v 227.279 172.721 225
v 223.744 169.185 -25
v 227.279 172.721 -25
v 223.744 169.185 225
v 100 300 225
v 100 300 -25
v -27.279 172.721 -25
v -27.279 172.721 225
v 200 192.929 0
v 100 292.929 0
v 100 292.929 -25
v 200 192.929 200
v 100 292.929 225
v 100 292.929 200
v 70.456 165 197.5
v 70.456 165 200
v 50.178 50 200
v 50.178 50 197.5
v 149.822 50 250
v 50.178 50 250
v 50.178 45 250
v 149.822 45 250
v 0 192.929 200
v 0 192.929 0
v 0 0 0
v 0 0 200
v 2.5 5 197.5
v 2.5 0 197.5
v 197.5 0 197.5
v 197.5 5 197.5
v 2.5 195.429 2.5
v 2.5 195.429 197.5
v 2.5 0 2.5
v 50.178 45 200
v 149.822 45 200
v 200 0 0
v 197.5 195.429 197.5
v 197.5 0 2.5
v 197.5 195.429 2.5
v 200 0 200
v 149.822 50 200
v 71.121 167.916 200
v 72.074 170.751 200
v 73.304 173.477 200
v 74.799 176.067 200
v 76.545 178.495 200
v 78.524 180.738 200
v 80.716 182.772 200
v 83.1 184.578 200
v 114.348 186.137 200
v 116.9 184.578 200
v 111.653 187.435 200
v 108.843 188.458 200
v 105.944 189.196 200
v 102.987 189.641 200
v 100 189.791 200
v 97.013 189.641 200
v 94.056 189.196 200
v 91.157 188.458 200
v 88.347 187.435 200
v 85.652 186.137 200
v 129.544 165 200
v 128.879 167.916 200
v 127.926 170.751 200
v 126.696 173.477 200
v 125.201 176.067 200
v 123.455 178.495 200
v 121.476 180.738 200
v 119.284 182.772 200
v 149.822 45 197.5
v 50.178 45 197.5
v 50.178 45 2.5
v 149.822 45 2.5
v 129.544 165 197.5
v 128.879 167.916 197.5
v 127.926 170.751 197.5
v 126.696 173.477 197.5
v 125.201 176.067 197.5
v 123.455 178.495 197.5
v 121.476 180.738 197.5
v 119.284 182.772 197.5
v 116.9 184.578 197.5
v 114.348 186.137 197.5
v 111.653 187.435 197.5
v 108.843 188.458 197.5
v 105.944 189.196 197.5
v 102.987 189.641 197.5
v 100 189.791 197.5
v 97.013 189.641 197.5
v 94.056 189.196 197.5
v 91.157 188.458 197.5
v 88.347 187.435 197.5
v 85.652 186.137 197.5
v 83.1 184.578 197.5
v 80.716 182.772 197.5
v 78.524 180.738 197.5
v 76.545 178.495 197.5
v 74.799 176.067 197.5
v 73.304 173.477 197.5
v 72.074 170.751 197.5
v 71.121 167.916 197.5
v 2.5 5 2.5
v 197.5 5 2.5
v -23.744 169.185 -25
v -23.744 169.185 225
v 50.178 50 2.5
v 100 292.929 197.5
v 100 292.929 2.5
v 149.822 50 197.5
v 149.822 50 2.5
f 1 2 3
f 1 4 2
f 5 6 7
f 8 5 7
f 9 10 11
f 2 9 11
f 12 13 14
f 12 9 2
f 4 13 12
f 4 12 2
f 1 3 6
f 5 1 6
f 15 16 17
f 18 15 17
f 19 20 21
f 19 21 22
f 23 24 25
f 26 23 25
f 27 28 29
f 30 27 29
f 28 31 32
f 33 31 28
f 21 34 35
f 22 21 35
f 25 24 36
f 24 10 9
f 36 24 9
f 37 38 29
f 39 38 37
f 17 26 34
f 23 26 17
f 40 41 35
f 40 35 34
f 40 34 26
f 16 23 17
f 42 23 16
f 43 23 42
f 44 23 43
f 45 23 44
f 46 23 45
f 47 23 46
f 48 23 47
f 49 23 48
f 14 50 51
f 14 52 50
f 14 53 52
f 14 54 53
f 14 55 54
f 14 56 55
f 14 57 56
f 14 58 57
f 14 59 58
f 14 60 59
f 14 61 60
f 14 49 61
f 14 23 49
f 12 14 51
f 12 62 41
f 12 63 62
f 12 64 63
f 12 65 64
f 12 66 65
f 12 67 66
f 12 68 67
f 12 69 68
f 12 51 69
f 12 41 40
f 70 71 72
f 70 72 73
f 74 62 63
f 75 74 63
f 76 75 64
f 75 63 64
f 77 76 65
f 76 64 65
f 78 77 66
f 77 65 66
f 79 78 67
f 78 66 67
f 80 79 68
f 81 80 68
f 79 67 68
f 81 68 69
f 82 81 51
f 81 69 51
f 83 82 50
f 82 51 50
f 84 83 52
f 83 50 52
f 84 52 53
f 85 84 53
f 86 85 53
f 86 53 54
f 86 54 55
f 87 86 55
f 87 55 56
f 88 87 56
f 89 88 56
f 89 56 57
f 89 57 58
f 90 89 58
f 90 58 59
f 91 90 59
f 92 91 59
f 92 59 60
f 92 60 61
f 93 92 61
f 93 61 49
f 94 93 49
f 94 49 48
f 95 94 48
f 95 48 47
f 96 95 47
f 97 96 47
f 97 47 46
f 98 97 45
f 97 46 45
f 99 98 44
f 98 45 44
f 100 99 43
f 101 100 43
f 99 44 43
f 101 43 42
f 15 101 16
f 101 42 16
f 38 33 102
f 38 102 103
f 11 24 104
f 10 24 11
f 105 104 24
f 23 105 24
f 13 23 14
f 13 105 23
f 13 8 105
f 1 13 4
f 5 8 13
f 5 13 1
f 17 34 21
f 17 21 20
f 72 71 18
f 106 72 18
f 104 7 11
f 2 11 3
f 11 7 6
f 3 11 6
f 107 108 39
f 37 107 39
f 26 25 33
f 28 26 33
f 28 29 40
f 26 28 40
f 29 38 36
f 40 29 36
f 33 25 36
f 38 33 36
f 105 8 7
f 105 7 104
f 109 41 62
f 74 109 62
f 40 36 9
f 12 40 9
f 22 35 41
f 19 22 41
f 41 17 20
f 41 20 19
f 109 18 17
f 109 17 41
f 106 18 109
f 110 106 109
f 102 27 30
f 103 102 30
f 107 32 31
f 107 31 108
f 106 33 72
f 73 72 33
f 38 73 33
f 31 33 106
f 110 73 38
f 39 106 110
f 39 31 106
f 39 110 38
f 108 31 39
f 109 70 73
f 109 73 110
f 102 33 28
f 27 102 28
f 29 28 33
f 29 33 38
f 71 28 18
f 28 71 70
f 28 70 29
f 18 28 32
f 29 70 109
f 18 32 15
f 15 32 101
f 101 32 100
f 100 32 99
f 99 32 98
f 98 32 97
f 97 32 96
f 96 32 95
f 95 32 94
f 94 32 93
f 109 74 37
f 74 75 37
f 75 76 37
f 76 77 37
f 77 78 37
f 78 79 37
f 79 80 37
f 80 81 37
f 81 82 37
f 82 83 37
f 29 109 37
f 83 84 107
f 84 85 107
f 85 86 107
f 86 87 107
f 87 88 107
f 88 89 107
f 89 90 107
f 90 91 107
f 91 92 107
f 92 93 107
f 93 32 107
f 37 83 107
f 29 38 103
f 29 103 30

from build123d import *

# Parameters (mm, degrees)
F1_DEPTH       = 200
F2_T           = -2.5
F4_DEPTH       = 25
F4_DEPTH_BACK  = 225
F5_W           = 195
F5_H           = 195
F6_DEPTH       = 5
F8_DEPTH       = 25
F9_W           = 99.64367
F9_H           = 5
F10_DEPTH      = 50
F10_DEPTH_BACK = 200


with BuildPart() as f1:
    # F0 (on Top) → F1 (new body)
    with BuildSketch(Plane.XY):
        Polygon((0, 200), (0, 0), (200, 0), (200, 200), (100, 300), align=None)
    extrude(amount=F1_DEPTH)

    # F2
    f2_openings = [f1.faces().sort_by_distance(p)[0] for p in [
        (100, 0, 100),
    ]]
    offset(amount=F2_T, openings=f2_openings)

    # F3 (on face) → F4 (join, two sides)
    with BuildSketch(Plane.XY.offset(200)) as f4_sk:
        Polygon((227.279221, 172.720779), (100, 300), (-27.279221, 172.720779), (-23.743687, 169.185245), (100, 292.928932), (223.743687, 169.185245), align=None)
    extrude(amount=F4_DEPTH)
    extrude(f4_sk.sketch, amount=-F4_DEPTH_BACK)

    # F7 (on face) → F8 (cut)
    with BuildSketch(Plane.XY.offset(200)):
        with BuildLine():
            Line((149.821835, 50), (129.544233, 165))
            ThreePointArc((129.544233, 165), (100, 189.790555), (70.455767, 165))
            Line((70.455767, 165), (50.178165, 50))
            Line((50.178165, 50), (149.821835, 50))
        make_face()
    extrude(amount=-F8_DEPTH, mode=Mode.SUBTRACT)

    # F9 (on face) → F10 (join, two sides)
    with BuildSketch(Plane.XY.offset(200)) as f10_sk:
        with Locations((100, 47.5)):
            Rectangle(F9_W, F9_H)
    extrude(amount=F10_DEPTH)
    extrude(f10_sk.sketch, amount=-F10_DEPTH_BACK)


with BuildPart() as f6:
    # F5 (on face) → F6 (new body)
    with BuildSketch(Plane.XZ):
        with Locations((100, 100)):
            Rectangle(F5_W, F5_H)
    extrude(amount=-F6_DEPTH)


solid = Compound([f1.part, f6.part])
